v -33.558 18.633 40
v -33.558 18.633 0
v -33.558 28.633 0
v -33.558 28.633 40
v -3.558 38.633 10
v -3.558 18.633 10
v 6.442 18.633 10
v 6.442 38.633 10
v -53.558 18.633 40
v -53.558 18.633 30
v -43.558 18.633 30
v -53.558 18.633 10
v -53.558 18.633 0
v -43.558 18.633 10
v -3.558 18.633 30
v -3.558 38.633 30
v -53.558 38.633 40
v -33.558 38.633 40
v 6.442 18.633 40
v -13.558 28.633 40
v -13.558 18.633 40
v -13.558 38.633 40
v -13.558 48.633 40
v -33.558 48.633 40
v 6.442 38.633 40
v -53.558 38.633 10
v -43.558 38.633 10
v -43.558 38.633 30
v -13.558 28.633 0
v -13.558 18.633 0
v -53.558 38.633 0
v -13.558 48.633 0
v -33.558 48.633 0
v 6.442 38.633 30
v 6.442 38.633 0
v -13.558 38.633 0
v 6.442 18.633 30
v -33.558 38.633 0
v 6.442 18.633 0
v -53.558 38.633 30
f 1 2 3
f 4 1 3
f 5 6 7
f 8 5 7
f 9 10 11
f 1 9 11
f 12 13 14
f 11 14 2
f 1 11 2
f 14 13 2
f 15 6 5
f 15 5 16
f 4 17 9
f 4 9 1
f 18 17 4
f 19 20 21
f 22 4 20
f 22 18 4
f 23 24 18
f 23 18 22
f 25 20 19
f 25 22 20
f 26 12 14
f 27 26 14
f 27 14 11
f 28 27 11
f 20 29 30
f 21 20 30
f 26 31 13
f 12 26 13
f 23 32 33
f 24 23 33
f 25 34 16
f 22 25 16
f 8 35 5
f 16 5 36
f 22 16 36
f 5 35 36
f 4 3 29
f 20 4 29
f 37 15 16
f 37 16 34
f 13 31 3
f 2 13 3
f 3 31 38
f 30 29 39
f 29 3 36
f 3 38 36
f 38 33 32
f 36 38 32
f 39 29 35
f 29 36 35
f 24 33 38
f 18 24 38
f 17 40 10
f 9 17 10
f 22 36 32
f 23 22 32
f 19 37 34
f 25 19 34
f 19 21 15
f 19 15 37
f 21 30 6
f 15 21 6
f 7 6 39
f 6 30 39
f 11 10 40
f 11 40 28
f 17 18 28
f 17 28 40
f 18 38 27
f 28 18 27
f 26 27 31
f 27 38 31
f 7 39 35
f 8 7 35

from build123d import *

# Parameters (mm, degrees)
F1_DEPTH = 40
F2_W     = 10
F2_H     = 20
F3_DEPTH = 30.001
F4_W     = 10
F4_H     = 20
F5_DEPTH = 30.001


with BuildPart() as f1:
    # F0 (on Top) → F1 (new body)
    with BuildSketch(Plane.XY):
        Polygon((-33.55762, 38.633292), (-53.55762, 38.633292), (-53.55762, 18.633292), (-33.55762, 18.633292), (-33.55762, 28.633292), (-13.55762, 28.633292), (-13.55762, 18.633292), (6.44238, 18.633292), (6.44238, 38.633292), (-13.55762, 38.633292), (-13.55762, 48.633292), (-33.55762, 48.633292), align=None)
    extrude(amount=F1_DEPTH)

    # F2 (on face) → F3 (cut, through all)
    with BuildSketch(Plane.XZ.offset(-18.633292)):
        with Locations((-48.55762, 20)):
            Rectangle(F2_W, F2_H)
    extrude(amount=-F3_DEPTH, mode=Mode.SUBTRACT)

    # F4 (on face) → F5 (cut, through all)
    with BuildSketch(Plane.XZ.offset(-18.633292)):
        with Locations((1.44238, 20)):
            Rectangle(F4_W, F4_H)
    extrude(amount=-F5_DEPTH, mode=Mode.SUBTRACT)


solid = f1.part
